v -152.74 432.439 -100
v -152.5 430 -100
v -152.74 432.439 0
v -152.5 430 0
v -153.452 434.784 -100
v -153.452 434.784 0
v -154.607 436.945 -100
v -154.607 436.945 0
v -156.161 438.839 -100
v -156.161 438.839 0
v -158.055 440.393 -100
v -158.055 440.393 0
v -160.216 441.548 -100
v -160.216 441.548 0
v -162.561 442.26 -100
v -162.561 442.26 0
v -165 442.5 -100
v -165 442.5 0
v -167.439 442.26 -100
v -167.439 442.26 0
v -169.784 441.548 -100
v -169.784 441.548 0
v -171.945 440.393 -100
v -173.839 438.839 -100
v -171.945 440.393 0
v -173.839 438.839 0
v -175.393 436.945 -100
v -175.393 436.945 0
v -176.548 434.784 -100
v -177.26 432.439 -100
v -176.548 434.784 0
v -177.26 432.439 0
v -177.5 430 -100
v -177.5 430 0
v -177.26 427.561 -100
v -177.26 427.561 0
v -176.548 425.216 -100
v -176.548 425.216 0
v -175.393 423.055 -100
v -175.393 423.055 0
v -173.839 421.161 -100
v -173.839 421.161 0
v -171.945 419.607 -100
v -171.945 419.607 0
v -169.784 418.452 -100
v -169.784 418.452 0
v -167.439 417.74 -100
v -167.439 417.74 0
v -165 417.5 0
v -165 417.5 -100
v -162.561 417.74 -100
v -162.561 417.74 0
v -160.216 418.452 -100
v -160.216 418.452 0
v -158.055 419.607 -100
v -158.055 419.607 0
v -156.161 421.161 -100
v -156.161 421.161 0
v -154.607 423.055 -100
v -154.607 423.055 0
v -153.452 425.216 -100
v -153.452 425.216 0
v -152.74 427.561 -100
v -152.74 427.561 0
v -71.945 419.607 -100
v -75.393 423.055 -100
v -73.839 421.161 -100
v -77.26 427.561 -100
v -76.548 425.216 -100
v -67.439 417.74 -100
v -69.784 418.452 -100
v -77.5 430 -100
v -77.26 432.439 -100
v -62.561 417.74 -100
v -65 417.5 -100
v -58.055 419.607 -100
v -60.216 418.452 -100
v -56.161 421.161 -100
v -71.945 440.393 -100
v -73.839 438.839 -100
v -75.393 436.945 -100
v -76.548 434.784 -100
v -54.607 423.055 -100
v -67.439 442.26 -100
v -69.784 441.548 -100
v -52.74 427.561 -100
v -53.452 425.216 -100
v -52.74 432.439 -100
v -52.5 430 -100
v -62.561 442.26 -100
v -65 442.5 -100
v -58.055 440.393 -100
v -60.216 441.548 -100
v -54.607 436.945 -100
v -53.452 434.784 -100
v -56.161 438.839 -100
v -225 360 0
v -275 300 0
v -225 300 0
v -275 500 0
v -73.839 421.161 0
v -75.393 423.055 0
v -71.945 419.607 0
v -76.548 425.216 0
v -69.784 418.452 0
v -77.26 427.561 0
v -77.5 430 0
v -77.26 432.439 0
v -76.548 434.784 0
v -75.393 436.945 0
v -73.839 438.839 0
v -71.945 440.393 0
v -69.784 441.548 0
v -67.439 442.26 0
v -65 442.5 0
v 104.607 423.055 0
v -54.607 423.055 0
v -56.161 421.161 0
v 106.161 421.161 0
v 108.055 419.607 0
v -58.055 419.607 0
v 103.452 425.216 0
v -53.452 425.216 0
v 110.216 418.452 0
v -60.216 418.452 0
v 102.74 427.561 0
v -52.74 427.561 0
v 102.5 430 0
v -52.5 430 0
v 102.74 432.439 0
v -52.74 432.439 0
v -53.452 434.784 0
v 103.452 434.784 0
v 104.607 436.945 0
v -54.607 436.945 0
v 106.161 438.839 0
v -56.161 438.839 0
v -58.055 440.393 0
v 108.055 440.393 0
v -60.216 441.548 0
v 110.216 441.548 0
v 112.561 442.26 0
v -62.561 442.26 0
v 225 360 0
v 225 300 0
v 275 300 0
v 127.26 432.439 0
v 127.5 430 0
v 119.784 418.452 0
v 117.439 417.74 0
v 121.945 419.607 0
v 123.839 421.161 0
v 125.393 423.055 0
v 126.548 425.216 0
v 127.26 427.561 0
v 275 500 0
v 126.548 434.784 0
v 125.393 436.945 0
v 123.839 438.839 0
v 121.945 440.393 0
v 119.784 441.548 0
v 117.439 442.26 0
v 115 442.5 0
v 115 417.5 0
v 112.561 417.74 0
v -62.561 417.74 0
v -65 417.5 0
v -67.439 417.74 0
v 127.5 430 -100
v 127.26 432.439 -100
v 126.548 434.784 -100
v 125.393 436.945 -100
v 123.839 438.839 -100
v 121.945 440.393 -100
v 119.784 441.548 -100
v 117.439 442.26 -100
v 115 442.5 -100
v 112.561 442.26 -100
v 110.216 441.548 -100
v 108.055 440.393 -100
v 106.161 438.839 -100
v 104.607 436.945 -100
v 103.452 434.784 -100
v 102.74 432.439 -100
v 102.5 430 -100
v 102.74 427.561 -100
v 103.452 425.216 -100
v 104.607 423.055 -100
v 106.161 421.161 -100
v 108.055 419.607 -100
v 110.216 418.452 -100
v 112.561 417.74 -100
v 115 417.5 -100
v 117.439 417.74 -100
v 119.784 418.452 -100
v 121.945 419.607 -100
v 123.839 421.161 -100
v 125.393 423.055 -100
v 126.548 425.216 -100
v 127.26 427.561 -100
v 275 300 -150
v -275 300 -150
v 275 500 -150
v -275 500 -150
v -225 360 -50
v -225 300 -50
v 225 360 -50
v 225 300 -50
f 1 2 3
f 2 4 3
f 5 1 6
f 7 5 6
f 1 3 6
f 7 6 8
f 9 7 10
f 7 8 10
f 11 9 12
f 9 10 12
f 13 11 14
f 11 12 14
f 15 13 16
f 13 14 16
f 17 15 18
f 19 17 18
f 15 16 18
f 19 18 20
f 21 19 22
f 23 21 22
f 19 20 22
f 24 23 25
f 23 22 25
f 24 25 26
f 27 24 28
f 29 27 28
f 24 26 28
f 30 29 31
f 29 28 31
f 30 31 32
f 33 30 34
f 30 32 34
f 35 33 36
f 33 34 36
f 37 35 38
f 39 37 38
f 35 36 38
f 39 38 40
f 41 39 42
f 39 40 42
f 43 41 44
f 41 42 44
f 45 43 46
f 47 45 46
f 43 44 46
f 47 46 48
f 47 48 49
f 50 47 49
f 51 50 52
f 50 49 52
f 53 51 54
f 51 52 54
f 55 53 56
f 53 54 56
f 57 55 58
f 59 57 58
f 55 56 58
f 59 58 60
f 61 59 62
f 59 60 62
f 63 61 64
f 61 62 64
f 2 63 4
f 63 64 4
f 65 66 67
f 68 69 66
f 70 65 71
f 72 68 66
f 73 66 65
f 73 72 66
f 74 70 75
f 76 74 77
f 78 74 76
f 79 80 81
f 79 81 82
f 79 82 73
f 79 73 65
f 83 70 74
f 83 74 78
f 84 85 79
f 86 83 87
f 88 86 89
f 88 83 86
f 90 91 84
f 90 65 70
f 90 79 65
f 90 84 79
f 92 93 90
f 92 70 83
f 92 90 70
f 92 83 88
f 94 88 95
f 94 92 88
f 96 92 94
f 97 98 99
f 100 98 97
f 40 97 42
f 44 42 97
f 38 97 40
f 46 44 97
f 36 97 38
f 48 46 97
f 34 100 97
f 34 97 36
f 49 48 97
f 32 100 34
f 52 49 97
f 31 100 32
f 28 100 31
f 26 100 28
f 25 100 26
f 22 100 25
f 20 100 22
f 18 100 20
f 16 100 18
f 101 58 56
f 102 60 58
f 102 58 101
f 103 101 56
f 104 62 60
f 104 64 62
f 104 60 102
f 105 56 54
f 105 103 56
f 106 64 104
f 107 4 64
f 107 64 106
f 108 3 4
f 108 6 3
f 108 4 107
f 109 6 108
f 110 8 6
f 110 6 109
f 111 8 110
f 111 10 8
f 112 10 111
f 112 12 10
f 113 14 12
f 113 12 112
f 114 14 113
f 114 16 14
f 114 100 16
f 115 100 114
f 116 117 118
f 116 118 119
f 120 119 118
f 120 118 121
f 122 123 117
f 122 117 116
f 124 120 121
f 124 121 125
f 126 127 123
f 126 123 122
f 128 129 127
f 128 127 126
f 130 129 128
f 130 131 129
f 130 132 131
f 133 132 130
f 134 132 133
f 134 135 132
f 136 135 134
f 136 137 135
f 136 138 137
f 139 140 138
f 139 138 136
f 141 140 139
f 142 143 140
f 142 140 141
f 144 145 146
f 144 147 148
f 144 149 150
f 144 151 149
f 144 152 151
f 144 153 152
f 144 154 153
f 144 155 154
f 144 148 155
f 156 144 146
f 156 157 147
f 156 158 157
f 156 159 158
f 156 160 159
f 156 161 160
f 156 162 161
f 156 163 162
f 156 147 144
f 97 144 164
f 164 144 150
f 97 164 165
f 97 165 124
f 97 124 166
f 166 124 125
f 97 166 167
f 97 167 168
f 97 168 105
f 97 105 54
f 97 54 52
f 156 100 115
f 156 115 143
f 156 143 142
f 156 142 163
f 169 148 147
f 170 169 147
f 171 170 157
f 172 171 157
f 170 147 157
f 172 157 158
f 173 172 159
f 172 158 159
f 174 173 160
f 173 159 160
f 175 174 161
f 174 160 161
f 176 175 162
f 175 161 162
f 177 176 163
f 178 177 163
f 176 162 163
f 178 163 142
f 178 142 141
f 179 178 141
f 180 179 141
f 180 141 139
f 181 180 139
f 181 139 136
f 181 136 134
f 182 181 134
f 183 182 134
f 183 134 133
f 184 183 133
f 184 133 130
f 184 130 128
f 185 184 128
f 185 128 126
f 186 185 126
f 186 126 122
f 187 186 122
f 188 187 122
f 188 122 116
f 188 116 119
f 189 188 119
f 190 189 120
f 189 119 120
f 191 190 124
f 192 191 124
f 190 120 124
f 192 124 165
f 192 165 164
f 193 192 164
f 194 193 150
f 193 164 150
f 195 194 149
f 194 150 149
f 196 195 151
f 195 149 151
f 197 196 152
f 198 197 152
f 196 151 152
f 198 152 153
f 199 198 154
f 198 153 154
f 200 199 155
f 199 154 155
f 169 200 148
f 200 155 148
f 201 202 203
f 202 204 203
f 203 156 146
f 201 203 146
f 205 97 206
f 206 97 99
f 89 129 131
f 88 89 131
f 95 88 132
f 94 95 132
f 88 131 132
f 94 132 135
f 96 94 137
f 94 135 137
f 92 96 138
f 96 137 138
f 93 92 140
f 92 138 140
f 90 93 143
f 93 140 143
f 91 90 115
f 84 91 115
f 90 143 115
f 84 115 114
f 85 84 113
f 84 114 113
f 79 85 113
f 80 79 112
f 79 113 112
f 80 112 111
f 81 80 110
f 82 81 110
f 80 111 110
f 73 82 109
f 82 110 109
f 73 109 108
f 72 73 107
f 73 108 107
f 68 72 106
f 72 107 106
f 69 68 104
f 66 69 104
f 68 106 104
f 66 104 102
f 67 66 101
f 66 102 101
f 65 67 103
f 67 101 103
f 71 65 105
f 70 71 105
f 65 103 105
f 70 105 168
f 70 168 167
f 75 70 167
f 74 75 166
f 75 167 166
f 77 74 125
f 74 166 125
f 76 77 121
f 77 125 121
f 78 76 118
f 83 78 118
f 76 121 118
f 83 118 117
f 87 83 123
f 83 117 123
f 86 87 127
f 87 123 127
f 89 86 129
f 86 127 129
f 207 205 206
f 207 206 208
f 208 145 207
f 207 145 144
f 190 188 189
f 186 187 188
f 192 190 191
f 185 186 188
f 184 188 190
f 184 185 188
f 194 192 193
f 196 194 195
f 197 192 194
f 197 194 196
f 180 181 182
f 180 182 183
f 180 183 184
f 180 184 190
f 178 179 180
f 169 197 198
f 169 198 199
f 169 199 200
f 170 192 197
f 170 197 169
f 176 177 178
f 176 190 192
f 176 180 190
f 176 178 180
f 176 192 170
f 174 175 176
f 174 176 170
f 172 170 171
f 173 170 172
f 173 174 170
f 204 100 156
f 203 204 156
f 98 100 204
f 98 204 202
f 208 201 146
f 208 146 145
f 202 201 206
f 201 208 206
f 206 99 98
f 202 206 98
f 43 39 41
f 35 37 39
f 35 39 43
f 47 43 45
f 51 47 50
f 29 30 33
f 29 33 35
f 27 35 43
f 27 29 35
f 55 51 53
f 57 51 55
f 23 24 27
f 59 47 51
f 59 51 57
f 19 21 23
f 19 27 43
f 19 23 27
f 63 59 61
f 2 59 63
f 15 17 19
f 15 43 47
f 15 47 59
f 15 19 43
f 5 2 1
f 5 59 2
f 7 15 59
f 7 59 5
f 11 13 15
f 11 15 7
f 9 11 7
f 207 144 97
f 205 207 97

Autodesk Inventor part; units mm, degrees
ref_plane "YZ Plane" through (0, 0, 0) normal (1, 0, 0) x (0, 1, 0)
ref_plane "XZ Plane" through (0, 0, 0) normal (0, 1, 0) x (-1, 0, 0)
ref_plane "XY Plane" through (0, 0, 0) normal (0, 0, 1) x (1, 0, 0)
sketch "Skizze3" plane through (0, 0, 0) normal (0, 0, 1) x (1, 0, 0)
  line L0 (-500, 500) -> (500, 500)
  line L1 (500, 500) -> (500, -500)
  line L2 (500, -500) -> (-500, -500)
  line L3 (-500, -500) -> (-500, 500)
  line L4 (-500, 500) -> (-275, 500)
  line L5 (-275, 500) -> (-275, 440)
  line L6 (-275, 440) -> (-500, 440)
  line L7 (-500, 440) -> (-500, 500)
  line L8 (500, 500) -> (275, 500)
  line L9 (275, 500) -> (275, 440)
  line L10 (275, 440) -> (500, 440)
  line L11 (500, 440) -> (500, 500)
  line L12 (-275, 500) -> (275, 500)
  line L13 (275, 500) -> (275, 300)
  line L14 (275, 300) -> (-275, 300)
  line L15 (-275, 300) -> (-275, 500)
  line L16 (-225, 300) -> (225, 300)
  line L17 (225, 300) -> (225, 360)
  line L18 (225, 360) -> (-225, 360)
  line L19 (-225, 360) -> (-225, 300)
  line L20 (-500, -500) -> (500, -500)
  line L21 (500, -500) -> (500, -440)
  line L22 (500, -440) -> (-500, -440)
  line L23 (-500, -440) -> (-500, -500)
  line L24 (-440, 440) -> (-500, 440)
  line L25 (-500, 440) -> (-500, -440)
  line L26 (-500, -440) -> (-440, -440)
  line L27 (-440, -440) -> (-440, 440)
  line L28 (500, 440) -> (440, 440)
  line L29 (440, 440) -> (440, -440)
  line L30 (440, -440) -> (500, -440)
  line L31 (500, -440) -> (500, 440)
  arc A0 (-270, -10) -> (-225, 300) centre (-1315.2778, 300) ccw
  arc A1 (-500, -250) -> (-270, -10) centre (-617.8721, 93.1691) ccw
  arc A2 (225, 300) -> (280, 0) centre (1070.6818, 300) ccw
  arc A3 (280, 0) -> (500, -300) centre (931.7592, 247.2901) ccw
  arc A4 (-150, -240) -> (-95, 360) centre (-1146.8979, 153.9031) ccw
  arc A5 (-150, -240) -> (-225, -500) centre (1170.154, -761.631) ccw
  arc A6 (-5, 360) -> (105, -150) centre (4524.0164, 1069.9839) ccw
  arc A7 (125, -500) -> (105, -150) centre (-696.9412, -371.3966) ccw
  circle A8 centre (-165, 430) radius 12.5
  circle A9 centre (-65, 430) radius 12.5
  circle A10 centre (115, 430) radius 12.5
  point P0 (0, 0)
  point P1 (-500.0625, 0)
  point P2 (0, 500.0625)
  point P3 (-500, 0)
  point P4 (0, 500)
  point P5 (0, 360)
  dimension "d5" = 1000
  dimension "d8" = 1000
  dimension "d9" = 60
  dimension "d10" = 225
  dimension "d11" = 225
  dimension "d12" = 550
  dimension "d13" = 200
  dimension "d14" = 450
  dimension "d15" = 60
  dimension "d16" = 60
  dimension "d17" = 880
  dimension "d18" = 60
  dimension "d19" = 60
  dimension "d20" = 250
  dimension "d21" = 230
  dimension "d22" = 240
  dimension "d23" = 200
  dimension "d24" = 300
  dimension "d25" = 220
  dimension "d26" = 130
  dimension "d27" = 150
  dimension "d28" = 275
  dimension "d29" = 75
  dimension "d30" = 260
  dimension "d31" = 90
  dimension "d32" = 230
  dimension "d33" = 375
  dimension "d34" = 350
  dimension "d35" = 365
  dimension "d36" = 350
  dimension "d37" = 20
  dimension "d38" = 25
  dimension "d39" = 70
  dimension "d40" = 60
  dimension "d41" = 110
  dimension "d42" = 30
extrude "Extrusion2" add sketch "Skizze3" against normal blind 150 contours L0 L9 L13 L14 L17 L18 L19 L15 L5 | L19 L18 A4 L14 | L14 A6 L18 L17 | A4 L18 A6 L14 | A8 | A9 | A10
extrude "Extrusion3" cut sketch "Skizze3" against normal blind 50 contours L19 L18 A4 L14 | L14 A6 L18 L17 | A4 L18 A6 L14
extrude "Extrusion4" cut sketch "Skizze3" against normal blind 100 contours A8 | A9 | A10
equation "\"d16\" = d9"
equation "\"d18\" = d9"
equation "\"d19\" = d9"
properties part number "UA-70 Sockel"
